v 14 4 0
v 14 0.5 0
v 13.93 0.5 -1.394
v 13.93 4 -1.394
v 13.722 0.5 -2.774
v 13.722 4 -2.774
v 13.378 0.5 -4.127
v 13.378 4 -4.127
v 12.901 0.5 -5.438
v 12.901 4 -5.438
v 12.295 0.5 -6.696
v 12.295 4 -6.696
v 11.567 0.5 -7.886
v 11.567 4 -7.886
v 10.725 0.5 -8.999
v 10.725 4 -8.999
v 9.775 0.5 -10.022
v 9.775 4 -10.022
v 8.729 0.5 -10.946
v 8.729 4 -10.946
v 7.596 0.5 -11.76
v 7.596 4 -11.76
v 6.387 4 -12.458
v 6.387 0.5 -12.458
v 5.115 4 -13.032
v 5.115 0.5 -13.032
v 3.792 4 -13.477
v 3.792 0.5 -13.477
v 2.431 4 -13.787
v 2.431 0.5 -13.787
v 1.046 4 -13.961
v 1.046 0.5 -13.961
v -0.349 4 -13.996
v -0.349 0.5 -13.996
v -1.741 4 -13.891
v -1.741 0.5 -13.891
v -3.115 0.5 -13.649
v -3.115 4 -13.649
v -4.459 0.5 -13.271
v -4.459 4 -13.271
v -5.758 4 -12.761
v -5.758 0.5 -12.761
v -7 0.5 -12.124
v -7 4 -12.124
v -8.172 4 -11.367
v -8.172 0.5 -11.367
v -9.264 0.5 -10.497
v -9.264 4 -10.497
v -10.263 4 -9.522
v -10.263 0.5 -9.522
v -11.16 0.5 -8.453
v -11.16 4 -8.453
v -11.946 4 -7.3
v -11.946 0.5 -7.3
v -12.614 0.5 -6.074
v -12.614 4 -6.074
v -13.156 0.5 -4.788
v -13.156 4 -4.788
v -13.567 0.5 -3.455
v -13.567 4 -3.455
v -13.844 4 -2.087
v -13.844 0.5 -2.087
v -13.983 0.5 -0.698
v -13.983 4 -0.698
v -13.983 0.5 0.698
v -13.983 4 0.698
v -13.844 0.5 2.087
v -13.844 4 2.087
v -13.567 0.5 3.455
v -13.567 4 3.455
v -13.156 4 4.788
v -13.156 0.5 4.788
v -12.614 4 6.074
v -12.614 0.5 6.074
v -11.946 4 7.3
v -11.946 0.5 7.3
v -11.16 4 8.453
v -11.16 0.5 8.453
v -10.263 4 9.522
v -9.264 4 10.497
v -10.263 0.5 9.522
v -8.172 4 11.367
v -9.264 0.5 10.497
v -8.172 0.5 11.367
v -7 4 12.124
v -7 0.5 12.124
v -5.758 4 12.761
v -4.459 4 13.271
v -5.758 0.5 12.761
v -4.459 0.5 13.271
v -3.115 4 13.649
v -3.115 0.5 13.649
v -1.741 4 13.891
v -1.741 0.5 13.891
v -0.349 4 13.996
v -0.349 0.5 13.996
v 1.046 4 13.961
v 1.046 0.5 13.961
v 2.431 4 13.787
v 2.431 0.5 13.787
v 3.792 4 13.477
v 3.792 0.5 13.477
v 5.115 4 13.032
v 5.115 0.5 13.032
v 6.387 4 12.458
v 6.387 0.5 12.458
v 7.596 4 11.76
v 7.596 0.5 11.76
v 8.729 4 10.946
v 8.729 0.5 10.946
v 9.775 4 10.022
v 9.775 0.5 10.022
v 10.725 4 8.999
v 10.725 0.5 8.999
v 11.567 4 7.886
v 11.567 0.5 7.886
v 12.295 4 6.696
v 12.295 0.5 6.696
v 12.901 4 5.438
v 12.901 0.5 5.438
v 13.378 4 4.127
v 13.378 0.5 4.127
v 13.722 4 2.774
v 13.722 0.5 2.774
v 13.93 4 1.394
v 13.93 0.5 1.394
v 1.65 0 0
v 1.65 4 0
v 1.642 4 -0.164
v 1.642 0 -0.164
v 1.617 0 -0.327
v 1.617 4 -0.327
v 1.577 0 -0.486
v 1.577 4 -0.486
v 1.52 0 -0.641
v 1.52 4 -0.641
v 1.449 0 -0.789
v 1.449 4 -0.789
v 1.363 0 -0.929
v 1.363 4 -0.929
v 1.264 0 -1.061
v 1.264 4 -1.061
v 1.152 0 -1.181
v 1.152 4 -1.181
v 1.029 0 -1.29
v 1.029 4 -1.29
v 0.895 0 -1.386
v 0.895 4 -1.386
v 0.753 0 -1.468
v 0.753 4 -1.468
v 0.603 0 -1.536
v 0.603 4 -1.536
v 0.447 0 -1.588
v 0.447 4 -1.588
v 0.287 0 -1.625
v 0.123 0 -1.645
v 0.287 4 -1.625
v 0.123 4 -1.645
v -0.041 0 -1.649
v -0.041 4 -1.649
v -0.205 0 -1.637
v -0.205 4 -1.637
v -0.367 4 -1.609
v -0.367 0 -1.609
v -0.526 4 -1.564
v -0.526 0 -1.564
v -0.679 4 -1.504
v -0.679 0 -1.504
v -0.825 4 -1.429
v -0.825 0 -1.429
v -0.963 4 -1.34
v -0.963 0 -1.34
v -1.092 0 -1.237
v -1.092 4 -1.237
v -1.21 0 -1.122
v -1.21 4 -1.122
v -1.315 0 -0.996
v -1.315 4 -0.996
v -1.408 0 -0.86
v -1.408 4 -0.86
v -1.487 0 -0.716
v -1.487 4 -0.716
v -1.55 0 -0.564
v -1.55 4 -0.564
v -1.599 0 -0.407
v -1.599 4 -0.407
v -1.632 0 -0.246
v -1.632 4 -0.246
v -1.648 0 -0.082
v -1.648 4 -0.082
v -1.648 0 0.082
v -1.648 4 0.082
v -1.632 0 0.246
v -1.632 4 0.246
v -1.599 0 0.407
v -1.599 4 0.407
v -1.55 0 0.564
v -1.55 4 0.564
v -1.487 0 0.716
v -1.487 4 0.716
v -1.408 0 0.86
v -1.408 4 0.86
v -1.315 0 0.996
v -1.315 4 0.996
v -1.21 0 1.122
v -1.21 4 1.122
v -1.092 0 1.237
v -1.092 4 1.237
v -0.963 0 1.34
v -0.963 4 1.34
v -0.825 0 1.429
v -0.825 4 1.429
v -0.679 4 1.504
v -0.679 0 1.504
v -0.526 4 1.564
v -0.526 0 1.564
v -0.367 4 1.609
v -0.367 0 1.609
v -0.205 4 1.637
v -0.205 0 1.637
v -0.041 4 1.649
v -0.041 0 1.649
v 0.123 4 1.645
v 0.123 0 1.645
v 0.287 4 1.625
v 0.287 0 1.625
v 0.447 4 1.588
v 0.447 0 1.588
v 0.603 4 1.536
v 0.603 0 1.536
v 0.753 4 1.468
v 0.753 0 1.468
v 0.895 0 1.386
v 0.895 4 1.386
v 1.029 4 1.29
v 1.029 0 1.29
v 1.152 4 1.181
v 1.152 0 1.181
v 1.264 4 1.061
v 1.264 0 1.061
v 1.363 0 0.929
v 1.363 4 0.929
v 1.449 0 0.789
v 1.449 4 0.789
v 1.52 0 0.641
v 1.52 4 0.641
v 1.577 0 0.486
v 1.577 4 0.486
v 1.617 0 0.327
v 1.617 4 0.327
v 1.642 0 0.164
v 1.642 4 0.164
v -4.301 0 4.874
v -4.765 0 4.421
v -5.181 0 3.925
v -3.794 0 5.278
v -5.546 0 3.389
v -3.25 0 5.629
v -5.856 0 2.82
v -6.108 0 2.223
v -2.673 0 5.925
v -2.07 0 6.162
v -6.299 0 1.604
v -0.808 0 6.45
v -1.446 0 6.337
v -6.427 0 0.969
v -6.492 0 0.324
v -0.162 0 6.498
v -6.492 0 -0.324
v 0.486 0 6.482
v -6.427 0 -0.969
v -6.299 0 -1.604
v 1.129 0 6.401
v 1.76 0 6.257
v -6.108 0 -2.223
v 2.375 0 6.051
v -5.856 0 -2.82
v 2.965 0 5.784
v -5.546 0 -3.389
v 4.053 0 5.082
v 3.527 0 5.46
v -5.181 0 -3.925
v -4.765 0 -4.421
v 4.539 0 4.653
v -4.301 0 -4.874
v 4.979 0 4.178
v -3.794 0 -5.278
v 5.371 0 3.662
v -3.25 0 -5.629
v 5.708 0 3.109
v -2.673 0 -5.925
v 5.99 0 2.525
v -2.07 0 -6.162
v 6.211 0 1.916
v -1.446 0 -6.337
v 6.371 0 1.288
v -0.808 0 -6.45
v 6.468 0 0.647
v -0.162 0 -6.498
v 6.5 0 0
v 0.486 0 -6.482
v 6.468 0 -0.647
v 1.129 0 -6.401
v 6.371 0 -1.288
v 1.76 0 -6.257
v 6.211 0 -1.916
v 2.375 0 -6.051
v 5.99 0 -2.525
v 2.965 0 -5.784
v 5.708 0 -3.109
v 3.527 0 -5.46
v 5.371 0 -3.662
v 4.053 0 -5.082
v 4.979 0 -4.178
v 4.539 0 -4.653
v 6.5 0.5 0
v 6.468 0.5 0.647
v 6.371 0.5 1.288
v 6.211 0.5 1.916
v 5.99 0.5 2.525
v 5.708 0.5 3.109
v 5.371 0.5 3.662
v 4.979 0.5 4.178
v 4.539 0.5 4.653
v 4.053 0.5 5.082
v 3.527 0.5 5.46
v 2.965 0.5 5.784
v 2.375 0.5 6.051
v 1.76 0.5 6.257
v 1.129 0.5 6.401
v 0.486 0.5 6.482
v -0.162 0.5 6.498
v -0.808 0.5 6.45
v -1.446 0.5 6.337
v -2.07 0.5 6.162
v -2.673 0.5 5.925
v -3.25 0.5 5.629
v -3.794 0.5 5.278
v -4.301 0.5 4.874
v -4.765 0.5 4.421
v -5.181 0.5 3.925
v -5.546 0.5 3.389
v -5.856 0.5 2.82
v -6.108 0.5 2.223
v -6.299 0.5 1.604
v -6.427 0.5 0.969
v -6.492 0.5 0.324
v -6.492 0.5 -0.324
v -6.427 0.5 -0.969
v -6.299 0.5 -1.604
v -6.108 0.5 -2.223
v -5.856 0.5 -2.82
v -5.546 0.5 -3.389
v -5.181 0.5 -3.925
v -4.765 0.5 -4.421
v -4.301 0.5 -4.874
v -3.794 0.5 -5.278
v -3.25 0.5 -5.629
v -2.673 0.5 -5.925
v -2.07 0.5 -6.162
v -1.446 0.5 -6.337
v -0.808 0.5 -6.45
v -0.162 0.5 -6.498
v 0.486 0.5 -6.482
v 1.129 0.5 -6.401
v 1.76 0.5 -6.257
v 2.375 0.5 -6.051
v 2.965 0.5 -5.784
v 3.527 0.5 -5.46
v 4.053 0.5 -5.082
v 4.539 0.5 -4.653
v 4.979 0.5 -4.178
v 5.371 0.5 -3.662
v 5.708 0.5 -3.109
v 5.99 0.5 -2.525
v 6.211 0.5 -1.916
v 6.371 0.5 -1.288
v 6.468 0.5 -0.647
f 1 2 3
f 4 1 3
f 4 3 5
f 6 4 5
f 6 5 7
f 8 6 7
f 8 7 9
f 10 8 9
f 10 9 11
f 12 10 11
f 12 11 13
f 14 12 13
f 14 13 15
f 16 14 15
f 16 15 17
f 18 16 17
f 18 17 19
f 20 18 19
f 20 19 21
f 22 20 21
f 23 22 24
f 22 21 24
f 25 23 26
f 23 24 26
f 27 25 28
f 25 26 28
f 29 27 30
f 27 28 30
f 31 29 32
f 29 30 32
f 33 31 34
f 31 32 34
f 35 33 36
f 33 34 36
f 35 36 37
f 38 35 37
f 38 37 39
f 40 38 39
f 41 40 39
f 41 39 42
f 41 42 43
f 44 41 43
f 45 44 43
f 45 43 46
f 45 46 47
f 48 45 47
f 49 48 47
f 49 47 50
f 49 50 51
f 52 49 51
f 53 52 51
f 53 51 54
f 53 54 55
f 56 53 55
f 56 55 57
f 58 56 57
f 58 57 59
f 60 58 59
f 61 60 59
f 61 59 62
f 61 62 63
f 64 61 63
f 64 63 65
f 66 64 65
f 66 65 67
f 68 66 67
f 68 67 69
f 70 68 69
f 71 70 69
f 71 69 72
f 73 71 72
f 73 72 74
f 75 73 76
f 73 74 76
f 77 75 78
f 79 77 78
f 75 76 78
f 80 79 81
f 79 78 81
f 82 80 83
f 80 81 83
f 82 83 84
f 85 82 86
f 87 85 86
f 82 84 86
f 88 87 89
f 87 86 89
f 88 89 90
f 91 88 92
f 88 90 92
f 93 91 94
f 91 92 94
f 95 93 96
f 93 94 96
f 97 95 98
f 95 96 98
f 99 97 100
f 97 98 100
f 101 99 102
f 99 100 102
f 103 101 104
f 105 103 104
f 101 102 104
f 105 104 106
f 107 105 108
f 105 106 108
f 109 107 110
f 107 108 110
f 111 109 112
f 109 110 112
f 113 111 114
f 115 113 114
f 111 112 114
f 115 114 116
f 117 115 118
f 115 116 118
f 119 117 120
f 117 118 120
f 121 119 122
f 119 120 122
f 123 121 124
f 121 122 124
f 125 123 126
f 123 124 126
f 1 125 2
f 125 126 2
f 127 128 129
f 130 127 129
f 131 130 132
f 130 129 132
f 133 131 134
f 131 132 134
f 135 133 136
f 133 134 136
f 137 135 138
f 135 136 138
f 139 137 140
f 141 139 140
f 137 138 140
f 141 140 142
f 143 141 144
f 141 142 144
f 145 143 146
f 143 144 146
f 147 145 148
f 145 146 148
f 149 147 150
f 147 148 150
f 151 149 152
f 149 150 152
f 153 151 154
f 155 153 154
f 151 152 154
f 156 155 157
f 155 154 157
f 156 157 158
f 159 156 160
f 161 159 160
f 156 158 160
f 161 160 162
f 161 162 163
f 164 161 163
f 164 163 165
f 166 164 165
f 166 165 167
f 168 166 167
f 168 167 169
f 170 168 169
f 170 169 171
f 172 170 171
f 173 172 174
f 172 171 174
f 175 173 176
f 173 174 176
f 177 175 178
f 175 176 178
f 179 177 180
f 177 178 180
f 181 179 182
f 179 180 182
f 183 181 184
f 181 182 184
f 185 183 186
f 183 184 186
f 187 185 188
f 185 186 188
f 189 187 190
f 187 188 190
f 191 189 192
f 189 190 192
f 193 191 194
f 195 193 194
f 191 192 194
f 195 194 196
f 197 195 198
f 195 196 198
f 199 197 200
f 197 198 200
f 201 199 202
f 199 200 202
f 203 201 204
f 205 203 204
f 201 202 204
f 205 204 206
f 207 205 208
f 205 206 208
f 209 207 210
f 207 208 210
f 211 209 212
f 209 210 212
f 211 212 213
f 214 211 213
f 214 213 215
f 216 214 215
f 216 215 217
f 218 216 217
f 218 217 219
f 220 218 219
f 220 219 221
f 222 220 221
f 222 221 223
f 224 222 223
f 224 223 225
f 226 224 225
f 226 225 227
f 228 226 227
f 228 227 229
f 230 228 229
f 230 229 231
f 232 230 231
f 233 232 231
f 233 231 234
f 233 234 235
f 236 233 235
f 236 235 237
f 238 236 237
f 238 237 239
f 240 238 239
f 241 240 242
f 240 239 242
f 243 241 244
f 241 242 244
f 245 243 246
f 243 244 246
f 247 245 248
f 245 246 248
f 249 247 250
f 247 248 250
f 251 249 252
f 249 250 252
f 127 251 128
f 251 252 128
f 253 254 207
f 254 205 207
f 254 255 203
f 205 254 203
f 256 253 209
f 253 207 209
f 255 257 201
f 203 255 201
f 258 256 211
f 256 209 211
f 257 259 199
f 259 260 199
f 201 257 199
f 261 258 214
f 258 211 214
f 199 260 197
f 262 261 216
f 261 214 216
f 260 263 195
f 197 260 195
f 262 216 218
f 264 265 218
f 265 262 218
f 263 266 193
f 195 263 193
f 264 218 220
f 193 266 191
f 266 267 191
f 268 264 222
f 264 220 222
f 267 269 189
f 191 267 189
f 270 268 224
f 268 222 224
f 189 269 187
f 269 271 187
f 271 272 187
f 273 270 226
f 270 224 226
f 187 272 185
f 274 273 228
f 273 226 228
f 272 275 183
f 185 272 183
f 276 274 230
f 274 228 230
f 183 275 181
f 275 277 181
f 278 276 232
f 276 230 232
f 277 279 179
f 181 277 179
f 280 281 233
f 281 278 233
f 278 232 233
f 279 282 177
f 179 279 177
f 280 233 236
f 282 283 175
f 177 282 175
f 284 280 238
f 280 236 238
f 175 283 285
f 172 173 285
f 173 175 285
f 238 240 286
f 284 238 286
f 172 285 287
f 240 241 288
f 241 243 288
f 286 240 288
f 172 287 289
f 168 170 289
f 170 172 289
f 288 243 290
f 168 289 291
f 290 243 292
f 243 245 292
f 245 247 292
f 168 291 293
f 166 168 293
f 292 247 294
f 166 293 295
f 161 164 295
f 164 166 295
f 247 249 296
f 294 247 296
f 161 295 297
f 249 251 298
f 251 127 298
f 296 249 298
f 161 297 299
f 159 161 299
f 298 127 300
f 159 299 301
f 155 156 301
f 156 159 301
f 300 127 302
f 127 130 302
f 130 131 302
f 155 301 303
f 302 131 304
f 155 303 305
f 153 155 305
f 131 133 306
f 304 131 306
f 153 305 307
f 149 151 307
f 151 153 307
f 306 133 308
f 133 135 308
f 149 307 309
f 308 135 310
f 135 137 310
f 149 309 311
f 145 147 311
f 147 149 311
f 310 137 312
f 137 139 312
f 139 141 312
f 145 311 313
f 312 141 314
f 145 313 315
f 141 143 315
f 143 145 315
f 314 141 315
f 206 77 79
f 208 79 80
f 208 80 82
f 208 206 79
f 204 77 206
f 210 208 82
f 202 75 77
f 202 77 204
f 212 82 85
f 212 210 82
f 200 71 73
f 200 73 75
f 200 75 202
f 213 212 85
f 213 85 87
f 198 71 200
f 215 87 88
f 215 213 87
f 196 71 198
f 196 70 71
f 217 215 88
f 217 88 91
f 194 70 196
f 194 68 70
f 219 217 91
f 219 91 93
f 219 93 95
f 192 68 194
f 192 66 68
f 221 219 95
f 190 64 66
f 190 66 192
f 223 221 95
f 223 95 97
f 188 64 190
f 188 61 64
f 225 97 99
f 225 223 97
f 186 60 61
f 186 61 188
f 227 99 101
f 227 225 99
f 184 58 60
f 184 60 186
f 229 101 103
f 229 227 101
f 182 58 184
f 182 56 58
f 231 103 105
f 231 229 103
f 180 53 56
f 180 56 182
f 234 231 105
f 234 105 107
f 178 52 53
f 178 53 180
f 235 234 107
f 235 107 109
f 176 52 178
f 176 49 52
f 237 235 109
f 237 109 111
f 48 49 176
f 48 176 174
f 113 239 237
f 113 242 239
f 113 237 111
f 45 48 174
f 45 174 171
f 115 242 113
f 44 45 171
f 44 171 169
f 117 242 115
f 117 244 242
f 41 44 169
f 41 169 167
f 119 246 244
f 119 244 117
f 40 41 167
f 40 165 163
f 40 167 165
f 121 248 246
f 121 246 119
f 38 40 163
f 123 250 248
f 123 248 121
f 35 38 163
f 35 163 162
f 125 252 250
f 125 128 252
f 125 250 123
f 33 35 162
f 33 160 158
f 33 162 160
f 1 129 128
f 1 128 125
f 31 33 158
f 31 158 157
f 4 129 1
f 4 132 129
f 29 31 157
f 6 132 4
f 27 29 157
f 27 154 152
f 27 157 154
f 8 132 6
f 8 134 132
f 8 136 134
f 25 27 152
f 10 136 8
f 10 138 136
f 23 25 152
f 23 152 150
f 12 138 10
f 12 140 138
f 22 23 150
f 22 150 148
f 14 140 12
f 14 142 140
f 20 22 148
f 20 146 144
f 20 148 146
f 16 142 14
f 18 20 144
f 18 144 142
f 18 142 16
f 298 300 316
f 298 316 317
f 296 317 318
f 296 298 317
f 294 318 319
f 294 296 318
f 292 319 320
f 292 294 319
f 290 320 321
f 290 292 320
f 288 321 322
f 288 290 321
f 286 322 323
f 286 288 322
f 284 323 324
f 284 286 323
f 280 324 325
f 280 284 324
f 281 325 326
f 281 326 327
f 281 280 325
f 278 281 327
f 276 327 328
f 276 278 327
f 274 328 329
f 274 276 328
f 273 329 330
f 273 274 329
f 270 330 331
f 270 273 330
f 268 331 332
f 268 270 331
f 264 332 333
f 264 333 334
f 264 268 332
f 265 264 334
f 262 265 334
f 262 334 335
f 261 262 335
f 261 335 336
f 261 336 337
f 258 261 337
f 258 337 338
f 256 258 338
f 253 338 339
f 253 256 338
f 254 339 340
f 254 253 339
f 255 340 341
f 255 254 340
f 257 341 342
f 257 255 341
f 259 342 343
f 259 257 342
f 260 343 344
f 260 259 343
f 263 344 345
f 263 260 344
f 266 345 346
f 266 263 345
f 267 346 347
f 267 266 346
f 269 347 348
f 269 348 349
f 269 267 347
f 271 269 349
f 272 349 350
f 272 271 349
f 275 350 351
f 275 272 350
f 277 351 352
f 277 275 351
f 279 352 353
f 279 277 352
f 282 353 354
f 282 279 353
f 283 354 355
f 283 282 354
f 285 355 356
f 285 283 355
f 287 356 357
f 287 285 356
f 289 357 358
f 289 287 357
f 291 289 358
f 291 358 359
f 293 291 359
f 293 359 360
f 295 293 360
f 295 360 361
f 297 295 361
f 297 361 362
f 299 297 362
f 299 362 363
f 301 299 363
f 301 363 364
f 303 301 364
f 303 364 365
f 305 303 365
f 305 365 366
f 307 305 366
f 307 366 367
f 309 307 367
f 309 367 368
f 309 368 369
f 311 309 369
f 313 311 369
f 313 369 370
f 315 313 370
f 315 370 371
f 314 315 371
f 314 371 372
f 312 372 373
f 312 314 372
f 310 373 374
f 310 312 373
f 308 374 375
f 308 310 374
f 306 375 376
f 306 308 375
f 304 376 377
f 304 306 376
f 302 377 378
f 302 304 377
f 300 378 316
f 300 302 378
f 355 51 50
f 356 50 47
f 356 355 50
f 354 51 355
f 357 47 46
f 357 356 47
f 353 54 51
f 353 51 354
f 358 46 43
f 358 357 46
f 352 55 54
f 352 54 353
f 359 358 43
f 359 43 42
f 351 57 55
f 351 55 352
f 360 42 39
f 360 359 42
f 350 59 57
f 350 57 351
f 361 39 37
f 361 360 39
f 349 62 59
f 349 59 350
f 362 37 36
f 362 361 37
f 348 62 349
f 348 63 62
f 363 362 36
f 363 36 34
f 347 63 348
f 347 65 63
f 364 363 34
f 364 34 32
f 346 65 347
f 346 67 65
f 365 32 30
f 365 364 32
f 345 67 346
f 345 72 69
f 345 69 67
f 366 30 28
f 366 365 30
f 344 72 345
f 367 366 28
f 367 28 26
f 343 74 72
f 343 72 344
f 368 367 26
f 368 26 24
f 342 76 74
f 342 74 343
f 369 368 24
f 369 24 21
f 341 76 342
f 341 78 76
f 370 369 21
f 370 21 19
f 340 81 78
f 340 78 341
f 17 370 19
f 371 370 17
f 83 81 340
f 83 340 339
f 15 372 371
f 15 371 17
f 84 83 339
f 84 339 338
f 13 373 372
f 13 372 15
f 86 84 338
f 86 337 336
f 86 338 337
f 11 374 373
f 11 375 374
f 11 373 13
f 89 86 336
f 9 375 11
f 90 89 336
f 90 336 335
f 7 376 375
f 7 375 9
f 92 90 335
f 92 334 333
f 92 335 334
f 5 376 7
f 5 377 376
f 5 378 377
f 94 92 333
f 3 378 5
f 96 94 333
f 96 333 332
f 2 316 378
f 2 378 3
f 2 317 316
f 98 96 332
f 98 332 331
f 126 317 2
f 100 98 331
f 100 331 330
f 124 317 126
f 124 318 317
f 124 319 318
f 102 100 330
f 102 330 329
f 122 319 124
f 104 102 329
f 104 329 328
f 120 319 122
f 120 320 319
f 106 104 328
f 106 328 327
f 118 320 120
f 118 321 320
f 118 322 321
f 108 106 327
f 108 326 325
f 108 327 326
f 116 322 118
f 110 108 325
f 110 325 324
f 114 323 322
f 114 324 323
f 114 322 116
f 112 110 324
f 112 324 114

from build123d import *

# Parameters (mm, degrees)
SKETCH1_R           = 14
BOSS_EXTRUDE1_DEPTH = 4
SKETCH2_R           = 14
SKETCH2_R_2         = 6.5
CUT_EXTRUDE1_DEPTH  = 0.5
SKETCH3_R           = 1.65
CUT_EXTRUDE2_DEPTH  = 4


with BuildPart() as part:
    # Sketch1 → Boss-Extrude1 (new body)
    with BuildSketch(Plane(origin=(0, 0, 0), x_dir=(1, 0, 0), z_dir=(0, 1, 0))):
        Circle(SKETCH1_R)
    extrude(amount=BOSS_EXTRUDE1_DEPTH)

    # Sketch2 → Cut-Extrude1 (cut)
    with BuildSketch(Plane.XZ):
        Circle(SKETCH2_R)
        Circle(SKETCH2_R_2, mode=Mode.SUBTRACT)
    extrude(amount=-CUT_EXTRUDE1_DEPTH, mode=Mode.SUBTRACT)

    # Sketch3 → Cut-Extrude2 (cut)
    with BuildSketch(Plane(origin=(0, 4, 0), x_dir=(1, 0, 0), z_dir=(0, 1, 0))):
        Circle(SKETCH3_R)
    extrude(amount=-CUT_EXTRUDE2_DEPTH, mode=Mode.SUBTRACT)


solid = part.part
